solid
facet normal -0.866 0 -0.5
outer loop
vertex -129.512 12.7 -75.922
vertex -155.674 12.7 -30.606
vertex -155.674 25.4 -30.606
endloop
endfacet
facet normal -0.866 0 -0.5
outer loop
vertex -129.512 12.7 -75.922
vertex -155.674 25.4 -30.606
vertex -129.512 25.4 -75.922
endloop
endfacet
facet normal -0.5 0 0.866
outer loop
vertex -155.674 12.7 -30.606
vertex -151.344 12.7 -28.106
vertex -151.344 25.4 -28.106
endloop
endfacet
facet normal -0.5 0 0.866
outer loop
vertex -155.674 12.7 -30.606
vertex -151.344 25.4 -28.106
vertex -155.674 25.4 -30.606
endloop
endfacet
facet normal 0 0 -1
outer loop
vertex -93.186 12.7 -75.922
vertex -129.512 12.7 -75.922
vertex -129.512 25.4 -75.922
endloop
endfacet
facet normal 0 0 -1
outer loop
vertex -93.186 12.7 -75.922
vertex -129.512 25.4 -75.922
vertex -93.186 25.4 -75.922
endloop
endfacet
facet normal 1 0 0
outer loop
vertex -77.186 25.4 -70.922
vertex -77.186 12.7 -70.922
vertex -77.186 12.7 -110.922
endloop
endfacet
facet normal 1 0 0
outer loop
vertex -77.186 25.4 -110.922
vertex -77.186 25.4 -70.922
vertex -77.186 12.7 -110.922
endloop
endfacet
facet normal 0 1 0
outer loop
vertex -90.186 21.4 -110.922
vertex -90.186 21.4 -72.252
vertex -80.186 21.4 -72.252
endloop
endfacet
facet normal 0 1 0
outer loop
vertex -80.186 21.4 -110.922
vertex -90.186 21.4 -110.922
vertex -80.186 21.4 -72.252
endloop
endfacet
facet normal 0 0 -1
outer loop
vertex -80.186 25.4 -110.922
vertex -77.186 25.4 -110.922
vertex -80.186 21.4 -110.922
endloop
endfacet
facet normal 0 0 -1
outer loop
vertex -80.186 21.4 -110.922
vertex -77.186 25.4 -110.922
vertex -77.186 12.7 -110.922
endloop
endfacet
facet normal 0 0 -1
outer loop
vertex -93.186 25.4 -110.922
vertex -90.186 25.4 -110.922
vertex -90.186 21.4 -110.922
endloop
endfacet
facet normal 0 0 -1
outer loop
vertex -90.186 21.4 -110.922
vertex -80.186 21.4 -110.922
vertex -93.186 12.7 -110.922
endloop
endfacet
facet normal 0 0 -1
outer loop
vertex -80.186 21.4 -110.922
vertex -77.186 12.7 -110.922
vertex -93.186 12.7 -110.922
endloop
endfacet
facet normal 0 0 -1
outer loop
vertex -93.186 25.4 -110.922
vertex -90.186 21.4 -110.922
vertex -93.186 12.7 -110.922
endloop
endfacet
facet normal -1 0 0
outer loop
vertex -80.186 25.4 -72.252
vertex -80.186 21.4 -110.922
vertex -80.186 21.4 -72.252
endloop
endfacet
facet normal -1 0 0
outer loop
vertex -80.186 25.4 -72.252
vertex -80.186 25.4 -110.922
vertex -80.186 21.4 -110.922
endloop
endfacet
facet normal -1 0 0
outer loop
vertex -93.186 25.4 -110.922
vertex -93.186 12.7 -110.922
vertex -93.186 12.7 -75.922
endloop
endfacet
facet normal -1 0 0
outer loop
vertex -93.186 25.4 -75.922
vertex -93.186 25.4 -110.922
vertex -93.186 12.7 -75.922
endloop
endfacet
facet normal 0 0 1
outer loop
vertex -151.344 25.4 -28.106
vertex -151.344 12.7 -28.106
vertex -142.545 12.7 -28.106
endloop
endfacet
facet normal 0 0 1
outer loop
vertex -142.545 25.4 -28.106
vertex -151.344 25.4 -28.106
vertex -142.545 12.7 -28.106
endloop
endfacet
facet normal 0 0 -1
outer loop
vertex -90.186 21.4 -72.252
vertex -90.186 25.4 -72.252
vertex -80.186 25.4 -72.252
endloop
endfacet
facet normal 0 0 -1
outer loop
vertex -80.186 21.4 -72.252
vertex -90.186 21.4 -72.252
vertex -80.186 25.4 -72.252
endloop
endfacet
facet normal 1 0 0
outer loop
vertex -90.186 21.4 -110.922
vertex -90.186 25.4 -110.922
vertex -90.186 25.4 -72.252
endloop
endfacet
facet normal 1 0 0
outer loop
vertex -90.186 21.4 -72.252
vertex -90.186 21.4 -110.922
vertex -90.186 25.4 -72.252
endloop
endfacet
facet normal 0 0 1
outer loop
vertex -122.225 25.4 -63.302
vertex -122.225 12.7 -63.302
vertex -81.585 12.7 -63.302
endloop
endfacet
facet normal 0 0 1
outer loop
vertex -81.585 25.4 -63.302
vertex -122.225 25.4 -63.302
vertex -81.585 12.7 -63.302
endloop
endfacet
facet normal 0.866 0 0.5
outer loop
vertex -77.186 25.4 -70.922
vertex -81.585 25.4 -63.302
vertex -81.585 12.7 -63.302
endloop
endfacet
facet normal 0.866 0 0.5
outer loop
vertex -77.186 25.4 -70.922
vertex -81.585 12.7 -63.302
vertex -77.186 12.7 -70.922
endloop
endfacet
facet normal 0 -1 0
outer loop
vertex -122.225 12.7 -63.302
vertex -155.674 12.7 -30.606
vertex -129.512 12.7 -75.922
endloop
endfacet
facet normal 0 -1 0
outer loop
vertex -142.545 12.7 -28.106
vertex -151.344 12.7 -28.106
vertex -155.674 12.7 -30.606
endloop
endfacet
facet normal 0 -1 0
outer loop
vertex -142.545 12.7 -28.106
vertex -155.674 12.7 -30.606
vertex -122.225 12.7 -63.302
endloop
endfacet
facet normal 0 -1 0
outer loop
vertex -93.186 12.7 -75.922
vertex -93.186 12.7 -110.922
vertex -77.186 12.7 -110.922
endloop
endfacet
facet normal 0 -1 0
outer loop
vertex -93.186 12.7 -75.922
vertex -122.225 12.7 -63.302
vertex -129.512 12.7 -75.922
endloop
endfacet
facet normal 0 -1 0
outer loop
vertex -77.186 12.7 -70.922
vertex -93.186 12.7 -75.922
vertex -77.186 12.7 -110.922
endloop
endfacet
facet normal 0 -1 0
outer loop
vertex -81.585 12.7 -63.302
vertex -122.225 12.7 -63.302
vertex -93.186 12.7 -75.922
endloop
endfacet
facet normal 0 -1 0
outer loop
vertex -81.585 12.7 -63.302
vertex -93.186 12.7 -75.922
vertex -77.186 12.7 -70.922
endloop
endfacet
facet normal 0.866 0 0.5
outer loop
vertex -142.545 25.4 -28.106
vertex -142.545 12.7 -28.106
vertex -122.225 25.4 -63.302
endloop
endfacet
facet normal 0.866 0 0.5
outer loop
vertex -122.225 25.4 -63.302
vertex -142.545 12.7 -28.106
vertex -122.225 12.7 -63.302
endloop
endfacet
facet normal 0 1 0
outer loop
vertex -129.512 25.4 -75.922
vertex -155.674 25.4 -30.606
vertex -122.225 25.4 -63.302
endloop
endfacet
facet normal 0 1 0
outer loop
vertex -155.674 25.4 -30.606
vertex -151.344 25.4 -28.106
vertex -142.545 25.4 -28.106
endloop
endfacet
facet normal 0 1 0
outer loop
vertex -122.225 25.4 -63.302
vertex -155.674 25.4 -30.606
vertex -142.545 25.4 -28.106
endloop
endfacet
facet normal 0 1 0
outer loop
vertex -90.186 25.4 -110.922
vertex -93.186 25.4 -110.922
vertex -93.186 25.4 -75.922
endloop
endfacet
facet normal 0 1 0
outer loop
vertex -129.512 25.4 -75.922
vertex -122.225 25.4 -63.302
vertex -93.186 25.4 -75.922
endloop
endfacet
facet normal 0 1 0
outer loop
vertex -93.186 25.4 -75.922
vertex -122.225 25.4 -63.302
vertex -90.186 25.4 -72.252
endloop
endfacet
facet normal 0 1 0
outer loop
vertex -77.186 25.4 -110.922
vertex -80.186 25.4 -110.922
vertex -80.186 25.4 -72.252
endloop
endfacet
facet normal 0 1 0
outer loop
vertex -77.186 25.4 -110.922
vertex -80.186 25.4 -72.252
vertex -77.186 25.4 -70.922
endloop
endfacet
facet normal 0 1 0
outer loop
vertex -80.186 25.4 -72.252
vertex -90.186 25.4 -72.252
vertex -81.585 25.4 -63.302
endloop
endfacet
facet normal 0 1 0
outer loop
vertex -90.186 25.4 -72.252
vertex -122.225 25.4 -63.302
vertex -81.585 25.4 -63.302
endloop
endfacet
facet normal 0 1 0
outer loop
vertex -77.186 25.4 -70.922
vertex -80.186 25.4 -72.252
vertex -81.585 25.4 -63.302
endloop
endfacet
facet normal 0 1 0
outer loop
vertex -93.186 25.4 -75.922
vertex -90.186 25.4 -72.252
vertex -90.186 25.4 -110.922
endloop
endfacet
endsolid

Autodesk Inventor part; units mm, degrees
ref_plane "YZ Plane" through (0, 0, 0) normal (1, 0, 0) x (0, 1, 0)
ref_plane "Work Plane1" through (0, 12.7, 0) normal (0, 1, 0) x (1, 0, 0)
sketch "Sketch3" plane through (0, 12.7, 0) normal (0, 1, 0) x (1, 0, 0)
  line L0 (-144.4503, 24.8067) -> (-122.2253, 63.3015)
  line L1 (-126.6247, 70.9215) -> (-122.2253, 63.3015)
  line L2 (-122.2253, 63.3015) -> (-81.5853, 63.3015)
  line L3 (-126.6247, 70.9215) -> (-151.3441, 28.1063)
  line L4 (-133.3378, 44.0541) -> (-139.9369, 47.8641)
  line L5 (-151.3441, 28.1063) -> (-142.5453, 28.1063)
  line L6 (-126.6247, 70.9215) -> (-77.1859, 70.9215)
  line L7 (-81.5853, 63.3015) -> (-77.1859, 70.9215)
  line L8 (-151.3441, 28.1063) -> (-155.6743, 30.6063)
  line L9 (-151.3441, 28.1063) -> (-146.3441, 28.1063) construction
  line L10 (-155.6743, 30.6063) -> (-129.5115, 75.9215)
  line L11 (-130.9549, 73.4215) -> (-126.6247, 70.9215)
  line L12 (-126.6247, 70.9215) -> (-129.5115, 75.9215)
  line L13 (-126.6247, 70.9215) -> (-119.7825, 70.9215) construction
  line L14 (-80.0727, 75.9215) -> (-77.1859, 70.9215)
  line L15 (-129.5115, 75.9215) -> (-80.0727, 75.9215)
  line L16 (-91.4611, 75.9215) -> (-90.9796, 70.9215)
  point P0 (-77.3883, 70.9215)
  dimension "d84" = 44.45
  dimension "d85" = 120
  dimension "d86" = 7.62
  dimension "d105" = 120
  dimension "d133" = 40.64
  dimension "d134" = 120
  dimension "d135" = 7.62
  dimension "d160" = 90
  dimension "d163" = 5
  dimension "d164" = 150
  dimension "d166" = 5
  dimension "d168" = 120
ref_plane "Work Plane2" through (0, 88.9, 0) normal (0, 1, 0) x (1, 0, 0)
extrude "Extrusion16" add sketch "Sketch3" along normal blind 12.7 contours L5 L3 L4 L0 | L4 L3 L1 L0 | L1 L6 L7 L2
sketch "Sketch8" plane through (0, 12.7, 0) normal (0, -1, 0) x (1, 0, 0)
  line L0 (-81.5853, -63.3015) -> (-77.1859, -70.9215) projected
  line L1 (-77.1859, -70.9215) -> (-73.0826, -70.9215) construction
  line L2 (-77.1859, -70.9215) -> (-77.1859, -110.9215)
  line L3 (-77.1859, -70.9215) -> (-126.6247, -70.9215) projected
  line L4 (-77.1859, -70.9215) -> (-37.1859, -70.9215) construction
  line L5 (-77.1859, -110.9215) -> (-93.1859, -110.9215)
  line L6 (-93.1859, -110.9215) -> (-93.1859, -70.9215)
  point P0 (0, 0)
  dimension "d137" = 40
  dimension "d138" = 90
  dimension "d139" = 16
extrude "Extrusion18" add sketch "Sketch8" against normal blind 12.7
sketch "Sketch9" plane through (0, 25.4, 0) normal (0, 1, 0) x (1, 0, 0)
  line L0 (-93.1859, 110.9215) -> (-77.1859, 110.9215) projected
  line L1 (-77.1859, 110.9215) -> (-80.1859, 110.9215)
  line L2 (-93.1859, 110.9215) -> (-90.1859, 110.9215)
  line L3 (-80.1859, 110.9215) -> (-80.1859, 72.2521)
  line L4 (-80.1859, 110.9215) -> (-41.5165, 110.9215) construction
  line L5 (-90.1859, 110.9215) -> (-90.1859, 72.2521)
  line L6 (-90.1859, 72.2521) -> (-80.1859, 72.2521)
  point P0 (0, 0)
  dimension "d142" = 3
  dimension "d143" = 3
  dimension "d144" = 90
extrude "Extrusion20" [suppressed]
extrude "Extrusion21" cut sketch "Sketch9" against normal blind 4
extrude "Extrusion22" add sketch "Sketch3" along normal blind 12.7 contours L8 L10 L11 L3 | L12 L15 L16 L6 | L11 L10 L12
properties part number "HorizGrabberMoving"
